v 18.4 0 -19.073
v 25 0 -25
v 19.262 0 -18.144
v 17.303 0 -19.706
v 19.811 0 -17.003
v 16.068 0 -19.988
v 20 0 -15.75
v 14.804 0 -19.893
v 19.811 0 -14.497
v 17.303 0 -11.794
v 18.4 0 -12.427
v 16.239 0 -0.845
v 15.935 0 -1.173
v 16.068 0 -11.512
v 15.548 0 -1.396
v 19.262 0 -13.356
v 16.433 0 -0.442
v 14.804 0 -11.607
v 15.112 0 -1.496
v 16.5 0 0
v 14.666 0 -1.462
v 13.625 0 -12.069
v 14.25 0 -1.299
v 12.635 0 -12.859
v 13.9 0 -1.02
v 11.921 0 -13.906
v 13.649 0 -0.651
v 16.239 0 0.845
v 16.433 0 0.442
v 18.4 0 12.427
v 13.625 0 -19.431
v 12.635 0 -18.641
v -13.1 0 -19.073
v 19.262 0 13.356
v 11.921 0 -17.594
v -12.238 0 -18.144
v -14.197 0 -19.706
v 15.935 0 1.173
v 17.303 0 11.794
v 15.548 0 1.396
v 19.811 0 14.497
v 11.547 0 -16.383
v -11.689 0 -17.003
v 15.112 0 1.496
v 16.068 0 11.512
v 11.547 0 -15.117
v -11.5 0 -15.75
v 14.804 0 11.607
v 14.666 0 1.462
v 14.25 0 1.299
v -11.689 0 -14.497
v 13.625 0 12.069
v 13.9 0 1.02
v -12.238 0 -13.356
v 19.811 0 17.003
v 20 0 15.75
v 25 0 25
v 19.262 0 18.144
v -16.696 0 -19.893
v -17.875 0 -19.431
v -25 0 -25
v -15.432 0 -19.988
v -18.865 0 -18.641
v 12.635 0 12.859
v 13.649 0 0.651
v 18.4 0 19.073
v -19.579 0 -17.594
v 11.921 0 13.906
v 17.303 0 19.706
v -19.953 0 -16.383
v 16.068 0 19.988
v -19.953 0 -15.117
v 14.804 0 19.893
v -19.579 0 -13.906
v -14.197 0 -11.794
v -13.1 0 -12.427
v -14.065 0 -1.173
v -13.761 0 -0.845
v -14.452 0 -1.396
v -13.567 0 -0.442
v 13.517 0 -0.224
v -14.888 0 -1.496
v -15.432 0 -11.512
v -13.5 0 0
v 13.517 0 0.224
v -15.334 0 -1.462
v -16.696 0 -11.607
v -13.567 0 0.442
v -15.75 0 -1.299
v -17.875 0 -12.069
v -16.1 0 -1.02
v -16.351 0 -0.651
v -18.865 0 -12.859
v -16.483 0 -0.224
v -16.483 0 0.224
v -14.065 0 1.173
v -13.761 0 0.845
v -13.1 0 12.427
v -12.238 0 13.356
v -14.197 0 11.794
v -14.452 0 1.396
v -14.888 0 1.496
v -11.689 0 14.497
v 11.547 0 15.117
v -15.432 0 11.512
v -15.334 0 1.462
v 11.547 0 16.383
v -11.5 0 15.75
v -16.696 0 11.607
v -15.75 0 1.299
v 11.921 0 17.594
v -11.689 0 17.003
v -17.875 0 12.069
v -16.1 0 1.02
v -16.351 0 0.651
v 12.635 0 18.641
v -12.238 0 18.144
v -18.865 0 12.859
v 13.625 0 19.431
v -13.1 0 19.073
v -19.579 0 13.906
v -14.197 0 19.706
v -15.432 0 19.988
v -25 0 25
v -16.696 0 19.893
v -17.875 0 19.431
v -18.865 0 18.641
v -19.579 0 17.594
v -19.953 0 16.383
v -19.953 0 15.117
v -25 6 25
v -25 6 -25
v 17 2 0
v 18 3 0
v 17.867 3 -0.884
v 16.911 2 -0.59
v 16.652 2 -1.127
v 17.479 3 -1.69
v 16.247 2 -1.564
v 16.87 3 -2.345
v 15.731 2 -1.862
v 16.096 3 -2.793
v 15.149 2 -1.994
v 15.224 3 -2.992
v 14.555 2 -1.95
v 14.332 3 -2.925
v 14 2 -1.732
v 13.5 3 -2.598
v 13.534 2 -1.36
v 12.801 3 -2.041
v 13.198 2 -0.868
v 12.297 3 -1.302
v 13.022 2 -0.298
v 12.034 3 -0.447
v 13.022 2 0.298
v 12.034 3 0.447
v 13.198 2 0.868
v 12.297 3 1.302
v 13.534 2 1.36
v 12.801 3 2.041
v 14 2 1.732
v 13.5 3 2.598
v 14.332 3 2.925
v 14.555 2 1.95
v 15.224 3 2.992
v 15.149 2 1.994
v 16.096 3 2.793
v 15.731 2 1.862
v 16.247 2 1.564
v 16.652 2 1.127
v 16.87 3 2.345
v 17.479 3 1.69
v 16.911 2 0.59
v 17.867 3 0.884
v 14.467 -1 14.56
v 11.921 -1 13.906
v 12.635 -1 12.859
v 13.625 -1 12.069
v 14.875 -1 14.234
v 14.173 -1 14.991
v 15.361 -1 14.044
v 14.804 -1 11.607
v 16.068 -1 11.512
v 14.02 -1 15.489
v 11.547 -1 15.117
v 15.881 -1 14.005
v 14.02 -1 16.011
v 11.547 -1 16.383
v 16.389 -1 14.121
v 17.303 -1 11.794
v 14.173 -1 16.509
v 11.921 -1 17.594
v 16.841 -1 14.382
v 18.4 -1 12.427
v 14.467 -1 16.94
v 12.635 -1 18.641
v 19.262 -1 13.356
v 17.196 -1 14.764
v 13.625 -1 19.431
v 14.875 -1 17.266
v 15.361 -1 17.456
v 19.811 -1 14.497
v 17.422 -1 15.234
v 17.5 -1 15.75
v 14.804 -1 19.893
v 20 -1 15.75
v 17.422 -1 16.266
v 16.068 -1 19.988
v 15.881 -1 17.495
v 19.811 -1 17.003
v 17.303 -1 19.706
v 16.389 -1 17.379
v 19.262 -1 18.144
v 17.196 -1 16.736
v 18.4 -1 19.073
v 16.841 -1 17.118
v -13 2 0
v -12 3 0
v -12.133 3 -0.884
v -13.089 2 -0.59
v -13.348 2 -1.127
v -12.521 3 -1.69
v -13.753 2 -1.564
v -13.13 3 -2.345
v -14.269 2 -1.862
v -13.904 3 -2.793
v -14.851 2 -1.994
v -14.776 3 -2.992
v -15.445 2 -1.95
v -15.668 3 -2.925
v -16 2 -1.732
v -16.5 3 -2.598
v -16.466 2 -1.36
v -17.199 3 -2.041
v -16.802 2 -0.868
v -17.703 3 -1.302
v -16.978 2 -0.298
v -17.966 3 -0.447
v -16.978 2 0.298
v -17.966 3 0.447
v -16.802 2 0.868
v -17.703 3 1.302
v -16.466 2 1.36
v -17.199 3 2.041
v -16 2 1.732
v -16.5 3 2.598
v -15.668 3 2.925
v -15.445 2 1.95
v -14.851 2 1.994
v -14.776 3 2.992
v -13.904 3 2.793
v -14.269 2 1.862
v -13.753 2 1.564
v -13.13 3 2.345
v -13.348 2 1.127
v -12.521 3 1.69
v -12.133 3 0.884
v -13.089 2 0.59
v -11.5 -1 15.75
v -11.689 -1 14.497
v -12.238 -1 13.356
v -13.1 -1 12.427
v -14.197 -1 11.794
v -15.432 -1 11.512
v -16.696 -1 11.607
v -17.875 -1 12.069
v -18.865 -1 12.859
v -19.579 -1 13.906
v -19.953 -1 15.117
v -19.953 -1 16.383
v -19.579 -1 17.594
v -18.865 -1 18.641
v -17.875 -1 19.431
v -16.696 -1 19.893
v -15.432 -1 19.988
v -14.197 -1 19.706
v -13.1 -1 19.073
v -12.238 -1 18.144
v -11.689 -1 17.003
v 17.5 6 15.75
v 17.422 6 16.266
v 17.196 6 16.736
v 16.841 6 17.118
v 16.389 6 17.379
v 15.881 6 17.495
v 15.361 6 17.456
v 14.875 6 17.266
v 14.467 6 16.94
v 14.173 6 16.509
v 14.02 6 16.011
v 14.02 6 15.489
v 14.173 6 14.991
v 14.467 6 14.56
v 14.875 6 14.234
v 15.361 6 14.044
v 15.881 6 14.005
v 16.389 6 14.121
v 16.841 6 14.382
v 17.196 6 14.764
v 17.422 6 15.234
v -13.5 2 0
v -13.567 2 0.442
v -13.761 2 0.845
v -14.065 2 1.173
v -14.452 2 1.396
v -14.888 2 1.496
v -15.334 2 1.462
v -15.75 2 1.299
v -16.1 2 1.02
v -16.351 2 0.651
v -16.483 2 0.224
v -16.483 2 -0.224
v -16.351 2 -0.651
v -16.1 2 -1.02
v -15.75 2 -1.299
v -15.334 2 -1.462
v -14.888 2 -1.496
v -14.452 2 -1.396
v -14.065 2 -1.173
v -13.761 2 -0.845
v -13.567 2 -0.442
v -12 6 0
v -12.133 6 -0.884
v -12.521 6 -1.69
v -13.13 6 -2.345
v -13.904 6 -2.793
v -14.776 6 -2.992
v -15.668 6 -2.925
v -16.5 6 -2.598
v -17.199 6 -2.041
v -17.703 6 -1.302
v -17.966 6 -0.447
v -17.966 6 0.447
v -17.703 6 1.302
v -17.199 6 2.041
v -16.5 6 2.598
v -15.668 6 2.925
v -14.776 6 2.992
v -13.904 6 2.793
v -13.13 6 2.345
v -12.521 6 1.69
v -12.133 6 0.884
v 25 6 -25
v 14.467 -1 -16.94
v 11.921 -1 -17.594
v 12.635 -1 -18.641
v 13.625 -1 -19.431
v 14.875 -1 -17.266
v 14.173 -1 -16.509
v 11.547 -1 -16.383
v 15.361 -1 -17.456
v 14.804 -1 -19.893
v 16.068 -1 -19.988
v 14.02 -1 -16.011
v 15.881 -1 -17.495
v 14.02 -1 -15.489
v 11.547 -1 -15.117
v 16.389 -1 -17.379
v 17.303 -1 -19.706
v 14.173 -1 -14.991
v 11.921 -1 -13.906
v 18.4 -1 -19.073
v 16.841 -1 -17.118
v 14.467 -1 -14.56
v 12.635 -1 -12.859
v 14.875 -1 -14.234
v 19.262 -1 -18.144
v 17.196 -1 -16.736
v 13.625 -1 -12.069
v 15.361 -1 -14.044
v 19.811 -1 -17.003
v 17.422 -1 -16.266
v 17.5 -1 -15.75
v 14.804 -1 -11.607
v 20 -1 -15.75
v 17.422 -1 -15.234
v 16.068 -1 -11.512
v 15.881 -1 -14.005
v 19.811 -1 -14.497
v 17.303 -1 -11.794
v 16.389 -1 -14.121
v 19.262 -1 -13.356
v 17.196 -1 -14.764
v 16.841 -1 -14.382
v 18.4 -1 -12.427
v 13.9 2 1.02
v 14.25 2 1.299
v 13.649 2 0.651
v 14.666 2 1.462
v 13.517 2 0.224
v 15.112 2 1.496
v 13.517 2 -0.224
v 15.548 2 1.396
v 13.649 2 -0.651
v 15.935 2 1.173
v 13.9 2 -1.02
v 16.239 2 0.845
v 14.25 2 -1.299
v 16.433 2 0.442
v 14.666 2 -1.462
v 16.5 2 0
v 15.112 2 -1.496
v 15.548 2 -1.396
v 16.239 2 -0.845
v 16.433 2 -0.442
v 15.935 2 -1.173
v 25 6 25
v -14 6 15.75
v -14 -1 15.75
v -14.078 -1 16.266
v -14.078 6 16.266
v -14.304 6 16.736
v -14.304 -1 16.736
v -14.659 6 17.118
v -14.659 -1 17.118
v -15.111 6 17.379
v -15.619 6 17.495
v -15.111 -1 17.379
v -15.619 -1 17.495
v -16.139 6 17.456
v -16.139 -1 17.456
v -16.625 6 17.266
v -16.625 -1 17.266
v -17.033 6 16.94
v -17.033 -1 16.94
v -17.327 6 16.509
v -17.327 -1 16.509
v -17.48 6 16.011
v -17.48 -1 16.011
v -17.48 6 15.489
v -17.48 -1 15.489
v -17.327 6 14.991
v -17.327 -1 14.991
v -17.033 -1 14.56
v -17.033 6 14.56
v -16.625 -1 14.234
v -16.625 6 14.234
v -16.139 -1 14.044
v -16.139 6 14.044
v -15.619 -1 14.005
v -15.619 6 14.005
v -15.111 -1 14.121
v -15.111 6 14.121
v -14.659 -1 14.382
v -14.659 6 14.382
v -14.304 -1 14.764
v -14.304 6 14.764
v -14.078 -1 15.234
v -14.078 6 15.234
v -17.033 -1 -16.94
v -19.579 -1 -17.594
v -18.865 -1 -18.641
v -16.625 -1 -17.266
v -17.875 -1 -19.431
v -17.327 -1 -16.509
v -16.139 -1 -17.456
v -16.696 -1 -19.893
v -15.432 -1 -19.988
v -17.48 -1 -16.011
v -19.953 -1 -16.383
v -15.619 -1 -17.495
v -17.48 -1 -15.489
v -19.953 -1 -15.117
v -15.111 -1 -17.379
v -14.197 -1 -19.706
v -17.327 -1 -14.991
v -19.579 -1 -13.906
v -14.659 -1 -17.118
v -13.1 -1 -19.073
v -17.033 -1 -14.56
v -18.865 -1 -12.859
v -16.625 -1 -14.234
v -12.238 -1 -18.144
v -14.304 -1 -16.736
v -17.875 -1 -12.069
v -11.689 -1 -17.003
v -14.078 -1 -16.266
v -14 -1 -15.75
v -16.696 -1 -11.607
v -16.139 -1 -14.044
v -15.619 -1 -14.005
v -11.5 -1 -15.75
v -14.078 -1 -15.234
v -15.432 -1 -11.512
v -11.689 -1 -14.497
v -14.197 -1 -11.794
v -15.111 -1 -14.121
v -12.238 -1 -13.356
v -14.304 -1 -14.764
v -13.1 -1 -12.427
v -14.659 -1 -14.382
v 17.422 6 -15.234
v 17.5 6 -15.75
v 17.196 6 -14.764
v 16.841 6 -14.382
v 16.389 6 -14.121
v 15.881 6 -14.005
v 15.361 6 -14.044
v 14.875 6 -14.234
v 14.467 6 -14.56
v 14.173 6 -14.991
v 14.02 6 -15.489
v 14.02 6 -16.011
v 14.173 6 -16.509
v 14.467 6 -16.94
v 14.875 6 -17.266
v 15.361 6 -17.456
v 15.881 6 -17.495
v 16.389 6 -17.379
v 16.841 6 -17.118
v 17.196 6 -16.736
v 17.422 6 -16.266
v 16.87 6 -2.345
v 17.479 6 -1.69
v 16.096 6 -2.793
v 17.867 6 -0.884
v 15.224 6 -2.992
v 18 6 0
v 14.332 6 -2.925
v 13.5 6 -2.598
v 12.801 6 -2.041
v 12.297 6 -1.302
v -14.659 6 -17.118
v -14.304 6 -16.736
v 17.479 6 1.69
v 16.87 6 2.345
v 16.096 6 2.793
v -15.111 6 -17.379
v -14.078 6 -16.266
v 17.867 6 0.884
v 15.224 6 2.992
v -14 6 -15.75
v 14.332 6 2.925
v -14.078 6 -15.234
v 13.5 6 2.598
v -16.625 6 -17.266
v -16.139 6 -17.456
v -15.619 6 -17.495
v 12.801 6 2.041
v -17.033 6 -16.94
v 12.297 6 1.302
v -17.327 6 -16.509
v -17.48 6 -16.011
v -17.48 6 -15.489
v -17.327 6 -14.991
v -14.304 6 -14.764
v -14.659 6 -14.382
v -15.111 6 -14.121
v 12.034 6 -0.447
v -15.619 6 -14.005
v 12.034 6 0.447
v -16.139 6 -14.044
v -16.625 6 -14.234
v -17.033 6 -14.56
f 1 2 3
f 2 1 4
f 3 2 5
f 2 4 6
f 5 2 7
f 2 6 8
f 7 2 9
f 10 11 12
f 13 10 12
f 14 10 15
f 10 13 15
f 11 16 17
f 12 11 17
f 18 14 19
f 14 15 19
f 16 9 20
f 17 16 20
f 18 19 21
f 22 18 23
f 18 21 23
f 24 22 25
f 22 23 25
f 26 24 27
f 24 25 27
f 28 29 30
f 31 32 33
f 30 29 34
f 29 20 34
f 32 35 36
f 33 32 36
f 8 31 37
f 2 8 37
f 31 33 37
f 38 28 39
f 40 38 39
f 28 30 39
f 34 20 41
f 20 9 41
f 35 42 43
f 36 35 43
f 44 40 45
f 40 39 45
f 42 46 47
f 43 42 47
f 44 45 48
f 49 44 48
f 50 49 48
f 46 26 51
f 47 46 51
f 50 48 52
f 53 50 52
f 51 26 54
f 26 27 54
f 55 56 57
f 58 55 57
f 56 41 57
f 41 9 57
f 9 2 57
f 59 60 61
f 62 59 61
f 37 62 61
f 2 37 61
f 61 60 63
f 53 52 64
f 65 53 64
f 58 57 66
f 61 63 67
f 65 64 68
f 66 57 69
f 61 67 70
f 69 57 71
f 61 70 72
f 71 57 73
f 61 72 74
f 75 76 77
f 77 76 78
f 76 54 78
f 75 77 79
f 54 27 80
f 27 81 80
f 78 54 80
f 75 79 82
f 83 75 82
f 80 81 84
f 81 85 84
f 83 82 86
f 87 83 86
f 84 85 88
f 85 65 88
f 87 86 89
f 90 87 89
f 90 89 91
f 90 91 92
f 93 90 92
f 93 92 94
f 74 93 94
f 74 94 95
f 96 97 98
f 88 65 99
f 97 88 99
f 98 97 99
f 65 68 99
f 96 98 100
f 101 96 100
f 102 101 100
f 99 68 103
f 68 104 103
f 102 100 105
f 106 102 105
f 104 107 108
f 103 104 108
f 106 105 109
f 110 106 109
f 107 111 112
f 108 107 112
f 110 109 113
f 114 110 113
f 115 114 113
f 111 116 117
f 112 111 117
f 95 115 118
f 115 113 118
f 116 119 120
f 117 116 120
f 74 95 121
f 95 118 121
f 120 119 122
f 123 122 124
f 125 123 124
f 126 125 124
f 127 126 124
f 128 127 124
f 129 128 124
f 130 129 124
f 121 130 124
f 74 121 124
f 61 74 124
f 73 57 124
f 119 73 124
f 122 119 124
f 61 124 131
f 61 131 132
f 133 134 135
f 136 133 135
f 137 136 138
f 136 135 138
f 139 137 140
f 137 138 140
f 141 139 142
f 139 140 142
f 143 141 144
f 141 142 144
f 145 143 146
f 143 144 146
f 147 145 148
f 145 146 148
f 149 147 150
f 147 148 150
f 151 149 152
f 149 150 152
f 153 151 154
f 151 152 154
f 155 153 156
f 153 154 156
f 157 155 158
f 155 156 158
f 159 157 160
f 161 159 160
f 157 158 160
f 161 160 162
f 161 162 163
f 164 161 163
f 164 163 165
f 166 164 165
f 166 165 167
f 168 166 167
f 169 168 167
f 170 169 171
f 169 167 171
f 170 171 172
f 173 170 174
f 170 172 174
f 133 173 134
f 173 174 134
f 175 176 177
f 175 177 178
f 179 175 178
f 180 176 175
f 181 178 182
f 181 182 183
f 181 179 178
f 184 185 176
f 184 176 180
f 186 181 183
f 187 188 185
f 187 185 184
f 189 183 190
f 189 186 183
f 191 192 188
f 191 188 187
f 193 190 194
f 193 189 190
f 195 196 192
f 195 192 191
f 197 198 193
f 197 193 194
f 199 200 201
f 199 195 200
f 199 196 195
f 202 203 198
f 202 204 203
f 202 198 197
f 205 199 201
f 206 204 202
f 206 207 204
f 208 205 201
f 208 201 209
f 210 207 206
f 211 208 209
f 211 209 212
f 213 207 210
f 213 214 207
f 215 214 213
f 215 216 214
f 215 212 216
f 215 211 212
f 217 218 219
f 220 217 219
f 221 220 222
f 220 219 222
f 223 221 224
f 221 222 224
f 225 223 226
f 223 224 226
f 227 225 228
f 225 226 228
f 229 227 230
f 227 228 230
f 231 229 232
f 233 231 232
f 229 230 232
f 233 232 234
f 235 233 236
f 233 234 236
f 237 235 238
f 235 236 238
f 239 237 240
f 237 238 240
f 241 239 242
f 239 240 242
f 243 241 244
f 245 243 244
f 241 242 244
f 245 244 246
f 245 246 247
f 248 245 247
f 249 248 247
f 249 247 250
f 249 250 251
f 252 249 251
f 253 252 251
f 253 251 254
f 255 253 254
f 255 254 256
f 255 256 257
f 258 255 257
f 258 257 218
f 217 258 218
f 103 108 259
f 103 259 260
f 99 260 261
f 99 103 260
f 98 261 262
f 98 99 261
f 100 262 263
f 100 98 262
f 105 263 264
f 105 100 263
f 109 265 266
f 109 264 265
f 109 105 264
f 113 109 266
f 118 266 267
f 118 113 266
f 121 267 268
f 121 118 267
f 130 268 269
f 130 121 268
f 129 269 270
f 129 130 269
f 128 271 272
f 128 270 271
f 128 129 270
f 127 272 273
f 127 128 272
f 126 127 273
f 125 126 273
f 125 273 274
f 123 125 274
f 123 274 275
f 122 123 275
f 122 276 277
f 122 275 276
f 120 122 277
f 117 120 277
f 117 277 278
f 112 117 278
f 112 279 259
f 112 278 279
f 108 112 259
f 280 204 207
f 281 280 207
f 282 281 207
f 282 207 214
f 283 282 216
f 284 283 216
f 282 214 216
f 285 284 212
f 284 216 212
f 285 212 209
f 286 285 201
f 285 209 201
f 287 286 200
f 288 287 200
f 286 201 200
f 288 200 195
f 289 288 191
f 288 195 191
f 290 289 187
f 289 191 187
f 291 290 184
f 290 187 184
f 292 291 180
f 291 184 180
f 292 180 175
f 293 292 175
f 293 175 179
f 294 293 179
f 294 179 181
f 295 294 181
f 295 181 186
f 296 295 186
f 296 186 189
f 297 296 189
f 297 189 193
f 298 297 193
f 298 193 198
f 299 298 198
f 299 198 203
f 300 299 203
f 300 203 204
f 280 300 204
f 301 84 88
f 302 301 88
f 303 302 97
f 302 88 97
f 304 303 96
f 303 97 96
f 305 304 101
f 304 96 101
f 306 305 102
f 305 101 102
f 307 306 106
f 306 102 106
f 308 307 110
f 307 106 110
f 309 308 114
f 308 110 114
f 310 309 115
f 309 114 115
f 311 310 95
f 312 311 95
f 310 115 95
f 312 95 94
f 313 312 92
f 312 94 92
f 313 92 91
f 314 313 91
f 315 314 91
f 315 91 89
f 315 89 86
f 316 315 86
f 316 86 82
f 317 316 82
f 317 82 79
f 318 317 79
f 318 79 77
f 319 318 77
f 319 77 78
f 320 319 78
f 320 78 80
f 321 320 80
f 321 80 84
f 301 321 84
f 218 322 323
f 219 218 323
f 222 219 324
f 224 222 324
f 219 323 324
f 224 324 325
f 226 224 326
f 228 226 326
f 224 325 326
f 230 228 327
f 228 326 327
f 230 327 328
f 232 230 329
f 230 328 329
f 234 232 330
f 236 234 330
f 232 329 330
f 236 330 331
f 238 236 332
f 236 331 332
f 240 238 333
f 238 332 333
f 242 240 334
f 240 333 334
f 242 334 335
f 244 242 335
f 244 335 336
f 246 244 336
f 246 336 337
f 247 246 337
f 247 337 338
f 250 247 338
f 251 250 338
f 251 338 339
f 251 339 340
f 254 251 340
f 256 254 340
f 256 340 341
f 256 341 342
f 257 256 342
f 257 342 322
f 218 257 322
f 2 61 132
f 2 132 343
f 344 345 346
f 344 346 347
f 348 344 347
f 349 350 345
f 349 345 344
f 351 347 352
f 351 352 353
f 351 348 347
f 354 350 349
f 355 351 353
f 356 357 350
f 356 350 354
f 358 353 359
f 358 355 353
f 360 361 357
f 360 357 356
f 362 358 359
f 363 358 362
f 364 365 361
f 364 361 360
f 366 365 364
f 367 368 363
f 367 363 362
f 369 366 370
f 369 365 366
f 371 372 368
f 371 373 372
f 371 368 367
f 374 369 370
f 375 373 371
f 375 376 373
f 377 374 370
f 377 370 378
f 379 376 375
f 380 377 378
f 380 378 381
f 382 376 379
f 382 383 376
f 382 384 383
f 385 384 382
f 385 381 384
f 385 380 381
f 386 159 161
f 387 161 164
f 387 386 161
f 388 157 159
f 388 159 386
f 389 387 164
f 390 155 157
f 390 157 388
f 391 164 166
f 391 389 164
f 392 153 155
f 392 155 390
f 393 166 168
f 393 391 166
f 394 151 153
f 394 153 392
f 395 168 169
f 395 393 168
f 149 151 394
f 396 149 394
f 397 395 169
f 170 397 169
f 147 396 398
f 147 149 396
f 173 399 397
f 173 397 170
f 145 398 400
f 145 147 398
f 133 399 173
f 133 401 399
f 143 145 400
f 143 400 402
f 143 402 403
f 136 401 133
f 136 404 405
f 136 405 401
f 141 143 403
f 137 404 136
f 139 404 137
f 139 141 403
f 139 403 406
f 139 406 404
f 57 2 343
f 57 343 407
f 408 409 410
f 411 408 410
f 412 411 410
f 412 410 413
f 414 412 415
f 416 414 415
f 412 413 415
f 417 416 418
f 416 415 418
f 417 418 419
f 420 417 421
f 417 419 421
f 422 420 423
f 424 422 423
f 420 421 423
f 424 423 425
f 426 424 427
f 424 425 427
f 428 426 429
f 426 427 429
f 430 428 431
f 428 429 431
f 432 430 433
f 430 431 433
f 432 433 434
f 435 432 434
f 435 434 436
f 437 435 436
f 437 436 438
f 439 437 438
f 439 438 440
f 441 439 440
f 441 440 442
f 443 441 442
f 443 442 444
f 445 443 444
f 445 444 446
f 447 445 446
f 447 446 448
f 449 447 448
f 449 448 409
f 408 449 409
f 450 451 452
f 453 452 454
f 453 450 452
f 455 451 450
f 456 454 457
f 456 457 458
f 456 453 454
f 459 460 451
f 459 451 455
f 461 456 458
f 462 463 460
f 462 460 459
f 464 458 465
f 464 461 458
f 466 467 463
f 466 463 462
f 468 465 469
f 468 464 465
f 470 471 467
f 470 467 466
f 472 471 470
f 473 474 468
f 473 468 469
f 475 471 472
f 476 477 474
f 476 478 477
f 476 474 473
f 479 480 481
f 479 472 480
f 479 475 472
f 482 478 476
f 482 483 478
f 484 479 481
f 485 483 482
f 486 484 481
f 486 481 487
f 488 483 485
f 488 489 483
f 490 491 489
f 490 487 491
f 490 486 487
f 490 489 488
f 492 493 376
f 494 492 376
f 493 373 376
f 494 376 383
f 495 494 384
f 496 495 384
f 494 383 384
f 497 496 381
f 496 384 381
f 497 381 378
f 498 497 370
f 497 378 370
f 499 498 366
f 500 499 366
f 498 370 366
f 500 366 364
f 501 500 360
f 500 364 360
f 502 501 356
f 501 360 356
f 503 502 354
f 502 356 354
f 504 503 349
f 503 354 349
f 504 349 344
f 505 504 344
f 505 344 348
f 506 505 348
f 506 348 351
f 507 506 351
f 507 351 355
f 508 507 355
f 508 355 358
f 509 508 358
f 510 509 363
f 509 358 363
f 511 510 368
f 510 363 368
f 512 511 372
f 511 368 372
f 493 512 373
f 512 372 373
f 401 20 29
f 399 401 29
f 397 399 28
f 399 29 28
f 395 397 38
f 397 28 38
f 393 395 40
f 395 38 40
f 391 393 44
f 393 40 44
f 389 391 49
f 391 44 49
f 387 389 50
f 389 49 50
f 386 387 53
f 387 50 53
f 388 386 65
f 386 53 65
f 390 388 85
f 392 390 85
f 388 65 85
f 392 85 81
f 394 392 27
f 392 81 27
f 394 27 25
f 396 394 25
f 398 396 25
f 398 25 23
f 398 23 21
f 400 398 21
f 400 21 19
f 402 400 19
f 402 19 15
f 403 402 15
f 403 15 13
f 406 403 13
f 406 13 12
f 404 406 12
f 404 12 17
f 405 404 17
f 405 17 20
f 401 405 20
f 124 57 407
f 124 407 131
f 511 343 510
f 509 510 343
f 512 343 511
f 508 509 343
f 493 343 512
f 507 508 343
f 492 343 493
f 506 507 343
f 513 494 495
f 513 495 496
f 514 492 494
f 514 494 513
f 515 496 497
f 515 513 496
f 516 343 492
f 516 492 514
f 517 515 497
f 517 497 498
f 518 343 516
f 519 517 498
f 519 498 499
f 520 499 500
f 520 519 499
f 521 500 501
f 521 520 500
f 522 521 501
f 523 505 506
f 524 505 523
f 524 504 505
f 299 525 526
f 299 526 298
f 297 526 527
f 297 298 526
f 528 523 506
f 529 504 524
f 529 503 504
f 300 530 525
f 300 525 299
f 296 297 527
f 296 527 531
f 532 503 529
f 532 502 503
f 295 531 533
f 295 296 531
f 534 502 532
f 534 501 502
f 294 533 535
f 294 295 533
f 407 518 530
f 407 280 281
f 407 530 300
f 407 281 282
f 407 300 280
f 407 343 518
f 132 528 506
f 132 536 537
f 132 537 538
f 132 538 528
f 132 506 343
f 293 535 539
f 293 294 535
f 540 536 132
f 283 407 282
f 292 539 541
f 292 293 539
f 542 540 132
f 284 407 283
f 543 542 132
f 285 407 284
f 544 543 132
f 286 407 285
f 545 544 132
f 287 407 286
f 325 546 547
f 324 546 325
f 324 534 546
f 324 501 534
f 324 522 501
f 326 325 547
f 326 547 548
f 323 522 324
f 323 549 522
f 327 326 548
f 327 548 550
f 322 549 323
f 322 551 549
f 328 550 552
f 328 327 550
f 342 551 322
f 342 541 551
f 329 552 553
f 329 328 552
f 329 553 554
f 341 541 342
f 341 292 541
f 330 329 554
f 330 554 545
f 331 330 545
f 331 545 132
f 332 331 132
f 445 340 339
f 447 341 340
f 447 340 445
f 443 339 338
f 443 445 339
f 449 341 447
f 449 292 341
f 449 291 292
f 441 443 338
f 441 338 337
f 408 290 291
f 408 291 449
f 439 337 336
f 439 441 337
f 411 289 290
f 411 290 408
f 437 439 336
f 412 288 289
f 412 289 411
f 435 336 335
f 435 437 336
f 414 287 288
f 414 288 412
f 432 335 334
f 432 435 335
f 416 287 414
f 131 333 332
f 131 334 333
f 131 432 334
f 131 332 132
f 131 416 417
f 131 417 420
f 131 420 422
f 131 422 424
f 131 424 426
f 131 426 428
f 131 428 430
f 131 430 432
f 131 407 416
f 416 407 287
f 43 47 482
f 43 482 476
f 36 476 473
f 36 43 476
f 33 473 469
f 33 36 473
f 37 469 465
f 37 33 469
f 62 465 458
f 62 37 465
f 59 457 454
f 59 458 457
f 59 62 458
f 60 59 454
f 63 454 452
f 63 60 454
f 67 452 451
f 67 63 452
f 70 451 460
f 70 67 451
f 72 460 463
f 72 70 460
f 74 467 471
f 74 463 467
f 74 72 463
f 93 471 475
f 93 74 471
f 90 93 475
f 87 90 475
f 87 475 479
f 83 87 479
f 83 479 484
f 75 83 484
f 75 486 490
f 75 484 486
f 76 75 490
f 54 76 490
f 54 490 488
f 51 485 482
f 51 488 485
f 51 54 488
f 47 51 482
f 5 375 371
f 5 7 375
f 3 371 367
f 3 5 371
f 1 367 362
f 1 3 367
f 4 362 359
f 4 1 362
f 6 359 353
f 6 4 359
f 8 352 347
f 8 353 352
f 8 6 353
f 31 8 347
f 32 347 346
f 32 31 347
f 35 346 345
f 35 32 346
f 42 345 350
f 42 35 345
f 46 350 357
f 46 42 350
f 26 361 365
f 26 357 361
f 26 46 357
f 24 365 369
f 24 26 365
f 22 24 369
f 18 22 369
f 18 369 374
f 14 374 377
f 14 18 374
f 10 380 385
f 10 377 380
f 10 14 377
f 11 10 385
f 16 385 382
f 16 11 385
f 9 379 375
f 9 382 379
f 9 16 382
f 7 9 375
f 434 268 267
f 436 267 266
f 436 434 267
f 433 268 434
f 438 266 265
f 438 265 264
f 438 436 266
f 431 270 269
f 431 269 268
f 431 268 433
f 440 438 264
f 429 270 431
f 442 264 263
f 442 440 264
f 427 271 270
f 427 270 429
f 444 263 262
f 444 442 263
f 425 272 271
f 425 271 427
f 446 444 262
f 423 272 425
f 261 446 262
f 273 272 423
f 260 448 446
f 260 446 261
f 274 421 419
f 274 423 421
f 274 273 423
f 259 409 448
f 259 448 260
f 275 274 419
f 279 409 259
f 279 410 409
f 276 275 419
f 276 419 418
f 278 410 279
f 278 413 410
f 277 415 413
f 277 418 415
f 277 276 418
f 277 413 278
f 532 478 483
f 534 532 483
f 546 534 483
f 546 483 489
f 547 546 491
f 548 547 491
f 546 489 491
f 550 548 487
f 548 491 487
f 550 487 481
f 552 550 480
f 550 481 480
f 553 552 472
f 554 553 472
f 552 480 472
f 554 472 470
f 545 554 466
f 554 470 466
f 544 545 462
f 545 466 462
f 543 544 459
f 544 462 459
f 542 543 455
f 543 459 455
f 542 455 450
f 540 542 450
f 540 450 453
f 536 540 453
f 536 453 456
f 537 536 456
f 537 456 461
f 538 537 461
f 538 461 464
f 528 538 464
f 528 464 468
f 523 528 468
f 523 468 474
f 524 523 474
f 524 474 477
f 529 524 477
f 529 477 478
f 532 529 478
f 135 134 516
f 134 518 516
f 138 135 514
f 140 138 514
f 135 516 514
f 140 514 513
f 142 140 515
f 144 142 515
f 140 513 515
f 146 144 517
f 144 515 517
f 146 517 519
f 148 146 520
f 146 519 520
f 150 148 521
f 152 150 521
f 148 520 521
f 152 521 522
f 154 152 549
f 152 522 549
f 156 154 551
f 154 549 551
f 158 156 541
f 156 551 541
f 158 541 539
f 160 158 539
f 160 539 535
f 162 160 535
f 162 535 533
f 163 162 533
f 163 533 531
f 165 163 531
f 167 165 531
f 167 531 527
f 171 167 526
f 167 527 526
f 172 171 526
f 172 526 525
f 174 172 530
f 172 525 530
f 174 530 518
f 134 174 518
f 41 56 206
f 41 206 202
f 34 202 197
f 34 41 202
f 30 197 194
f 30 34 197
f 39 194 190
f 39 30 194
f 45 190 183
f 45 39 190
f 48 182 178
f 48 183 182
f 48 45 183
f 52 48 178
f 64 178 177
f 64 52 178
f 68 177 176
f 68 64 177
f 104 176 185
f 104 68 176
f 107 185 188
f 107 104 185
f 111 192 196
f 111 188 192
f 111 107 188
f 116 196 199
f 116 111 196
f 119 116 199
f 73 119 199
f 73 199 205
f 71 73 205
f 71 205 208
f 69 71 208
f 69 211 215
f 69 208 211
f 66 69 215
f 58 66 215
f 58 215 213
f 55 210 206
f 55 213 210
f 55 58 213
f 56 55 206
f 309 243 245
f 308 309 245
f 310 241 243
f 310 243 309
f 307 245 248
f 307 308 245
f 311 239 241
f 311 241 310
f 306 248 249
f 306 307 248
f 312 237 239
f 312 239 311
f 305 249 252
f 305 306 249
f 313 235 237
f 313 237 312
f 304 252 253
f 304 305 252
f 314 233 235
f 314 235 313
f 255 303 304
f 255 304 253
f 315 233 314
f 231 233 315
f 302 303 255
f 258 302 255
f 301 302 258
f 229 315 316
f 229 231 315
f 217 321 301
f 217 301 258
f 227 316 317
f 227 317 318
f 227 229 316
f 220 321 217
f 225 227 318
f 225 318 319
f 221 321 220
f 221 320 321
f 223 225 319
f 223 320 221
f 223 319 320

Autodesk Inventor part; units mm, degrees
ref_plane "YZ Plane" through (0, 0, 0) normal (1, 0, 0) x (0, 1, 0)
ref_plane "XZ Plane" through (0, 0, 0) normal (0, 1, 0) x (-1, 0, 0)
ref_plane "XY Plane" through (0, 0, 0) normal (0, 0, 1) x (1, 0, 0)
sketch "Skizze1" plane through (0, 0, 0) normal (0, 1, 0) x (-1, 0, 0)
  line L0 (25, -25) -> (-25, -25)
  line L1 (-25, -25) -> (-25, 25)
  line L2 (-25, 25) -> (25, 25)
  line L3 (25, 25) -> (25, -25)
  line L4 (25, -25) -> (-25, 25) construction
  line L5 (-25, -25) -> (25, 25) construction
  point P0 (0, 0)
  dimension "d0" = 50
  dimension "d1" = 50
extrude "Extrusion1" add sketch "Skizze1" along normal blind 6
sketch "Skizze2" plane through (0, 0, 0) normal (0, -1, 0) x (1, 0, 0)
  circle A0 centre (-15.75, 15.75) radius 4.25
  circle A1 centre (15.75, 15.75) radius 4.25
  circle A2 centre (15.75, -15.75) radius 4.25
  circle A3 centre (-15.75, -15.75) radius 4.25
  line L0 (-35, 0) -> (35, 0) projected
  line L1 (0, 35) -> (0, -35) projected
  point P0 (0, 0)
  dimension "d4" = 31.5
  dimension "d5" = 31.5
  dimension "d6" = 31.5
  dimension "d7" = 31.5
  dimension "d8" = 15.75
  dimension "d9" = 15.75
  dimension "d10" = 15.75
  dimension "d11" = 15.75
  dimension "d12" = 8.5
  dimension "d13" = 8.5
  dimension "d14" = 8.5
  dimension "d15" = 8.5
extrude "Extrusion2" add sketch "Skizze2" along normal blind 1
sketch "Skizze3" plane through (-15.75, -1, 15.75) normal (0, -1, 0) x (1, 0, 0)
  circle A0 centre (0, 0) radius 4.25 projected
  circle A1 centre (0, 0) radius 1.75
  circle A2 centre (31.5, 0) radius 4.25 projected
  circle A3 centre (31.5, 0) radius 1.75
  circle A4 centre (31.5, -31.5) radius 4.25 projected
  circle A5 centre (31.5, -31.5) radius 1.75
  circle A6 centre (0, -31.5) radius 4.25 projected
  circle A7 centre (0, -31.5) radius 1.75
  point P0 (15.75, -15.75)
  dimension "d18" = 3.5
  dimension "d19" = 3.5
  dimension "d20" = 3.5
  dimension "d21" = 3.5
extrude "Extrusion3" cut sketch "Skizze3" against normal blind 13 contours A1 | A3 | A5 | A7
sketch "Skizze4" plane through (0, 0, 0) normal (0, -1, 0) x (1, 0, 0)
  circle A0 centre (-15, 0) radius 1.5
  circle A1 centre (15, 0) radius 1.5
  line L0 (0, 35) -> (0, -35) projected
  point P0 (0, 0)
  dimension "d24" = 30
  dimension "d25" = 15
  dimension "d26" = 3
  dimension "d27" = 3
extrude "Extrusion4" cut sketch "Skizze4" against normal blind 13
sketch "Skizze7" plane through (0, 6, 0) normal (0, 1, 0) x (1, 0, 0)
  circle A0 centre (15, 0) radius 1.5 projected
  circle A1 centre (15, 0) radius 3
  circle A2 centre (-15, 0) radius 1.5 projected
  circle A3 centre (-15, 0) radius 3
  point P0 (0, 0)
  dimension "d39" = 6
  dimension "d40" = 6
extrude "Extrusion5" cut sketch "Skizze7" against normal blind 4 contours A0 | A1 | A2 | A3
chamfer "Fase1" distance 1 angle 45 2 edges at (12, 2, 0) (-18, 2, 0)
equation "\"d8\" = 0.5 * d6"
equation "\"d9\" = 0.5 * d7"
equation "\"d10\" = 0.5 * d5"
equation "\"d11\" = 0.5 * d4"
equation "\"d25\" = 0.5 * d24"
properties part number "Lagerhalterung"
